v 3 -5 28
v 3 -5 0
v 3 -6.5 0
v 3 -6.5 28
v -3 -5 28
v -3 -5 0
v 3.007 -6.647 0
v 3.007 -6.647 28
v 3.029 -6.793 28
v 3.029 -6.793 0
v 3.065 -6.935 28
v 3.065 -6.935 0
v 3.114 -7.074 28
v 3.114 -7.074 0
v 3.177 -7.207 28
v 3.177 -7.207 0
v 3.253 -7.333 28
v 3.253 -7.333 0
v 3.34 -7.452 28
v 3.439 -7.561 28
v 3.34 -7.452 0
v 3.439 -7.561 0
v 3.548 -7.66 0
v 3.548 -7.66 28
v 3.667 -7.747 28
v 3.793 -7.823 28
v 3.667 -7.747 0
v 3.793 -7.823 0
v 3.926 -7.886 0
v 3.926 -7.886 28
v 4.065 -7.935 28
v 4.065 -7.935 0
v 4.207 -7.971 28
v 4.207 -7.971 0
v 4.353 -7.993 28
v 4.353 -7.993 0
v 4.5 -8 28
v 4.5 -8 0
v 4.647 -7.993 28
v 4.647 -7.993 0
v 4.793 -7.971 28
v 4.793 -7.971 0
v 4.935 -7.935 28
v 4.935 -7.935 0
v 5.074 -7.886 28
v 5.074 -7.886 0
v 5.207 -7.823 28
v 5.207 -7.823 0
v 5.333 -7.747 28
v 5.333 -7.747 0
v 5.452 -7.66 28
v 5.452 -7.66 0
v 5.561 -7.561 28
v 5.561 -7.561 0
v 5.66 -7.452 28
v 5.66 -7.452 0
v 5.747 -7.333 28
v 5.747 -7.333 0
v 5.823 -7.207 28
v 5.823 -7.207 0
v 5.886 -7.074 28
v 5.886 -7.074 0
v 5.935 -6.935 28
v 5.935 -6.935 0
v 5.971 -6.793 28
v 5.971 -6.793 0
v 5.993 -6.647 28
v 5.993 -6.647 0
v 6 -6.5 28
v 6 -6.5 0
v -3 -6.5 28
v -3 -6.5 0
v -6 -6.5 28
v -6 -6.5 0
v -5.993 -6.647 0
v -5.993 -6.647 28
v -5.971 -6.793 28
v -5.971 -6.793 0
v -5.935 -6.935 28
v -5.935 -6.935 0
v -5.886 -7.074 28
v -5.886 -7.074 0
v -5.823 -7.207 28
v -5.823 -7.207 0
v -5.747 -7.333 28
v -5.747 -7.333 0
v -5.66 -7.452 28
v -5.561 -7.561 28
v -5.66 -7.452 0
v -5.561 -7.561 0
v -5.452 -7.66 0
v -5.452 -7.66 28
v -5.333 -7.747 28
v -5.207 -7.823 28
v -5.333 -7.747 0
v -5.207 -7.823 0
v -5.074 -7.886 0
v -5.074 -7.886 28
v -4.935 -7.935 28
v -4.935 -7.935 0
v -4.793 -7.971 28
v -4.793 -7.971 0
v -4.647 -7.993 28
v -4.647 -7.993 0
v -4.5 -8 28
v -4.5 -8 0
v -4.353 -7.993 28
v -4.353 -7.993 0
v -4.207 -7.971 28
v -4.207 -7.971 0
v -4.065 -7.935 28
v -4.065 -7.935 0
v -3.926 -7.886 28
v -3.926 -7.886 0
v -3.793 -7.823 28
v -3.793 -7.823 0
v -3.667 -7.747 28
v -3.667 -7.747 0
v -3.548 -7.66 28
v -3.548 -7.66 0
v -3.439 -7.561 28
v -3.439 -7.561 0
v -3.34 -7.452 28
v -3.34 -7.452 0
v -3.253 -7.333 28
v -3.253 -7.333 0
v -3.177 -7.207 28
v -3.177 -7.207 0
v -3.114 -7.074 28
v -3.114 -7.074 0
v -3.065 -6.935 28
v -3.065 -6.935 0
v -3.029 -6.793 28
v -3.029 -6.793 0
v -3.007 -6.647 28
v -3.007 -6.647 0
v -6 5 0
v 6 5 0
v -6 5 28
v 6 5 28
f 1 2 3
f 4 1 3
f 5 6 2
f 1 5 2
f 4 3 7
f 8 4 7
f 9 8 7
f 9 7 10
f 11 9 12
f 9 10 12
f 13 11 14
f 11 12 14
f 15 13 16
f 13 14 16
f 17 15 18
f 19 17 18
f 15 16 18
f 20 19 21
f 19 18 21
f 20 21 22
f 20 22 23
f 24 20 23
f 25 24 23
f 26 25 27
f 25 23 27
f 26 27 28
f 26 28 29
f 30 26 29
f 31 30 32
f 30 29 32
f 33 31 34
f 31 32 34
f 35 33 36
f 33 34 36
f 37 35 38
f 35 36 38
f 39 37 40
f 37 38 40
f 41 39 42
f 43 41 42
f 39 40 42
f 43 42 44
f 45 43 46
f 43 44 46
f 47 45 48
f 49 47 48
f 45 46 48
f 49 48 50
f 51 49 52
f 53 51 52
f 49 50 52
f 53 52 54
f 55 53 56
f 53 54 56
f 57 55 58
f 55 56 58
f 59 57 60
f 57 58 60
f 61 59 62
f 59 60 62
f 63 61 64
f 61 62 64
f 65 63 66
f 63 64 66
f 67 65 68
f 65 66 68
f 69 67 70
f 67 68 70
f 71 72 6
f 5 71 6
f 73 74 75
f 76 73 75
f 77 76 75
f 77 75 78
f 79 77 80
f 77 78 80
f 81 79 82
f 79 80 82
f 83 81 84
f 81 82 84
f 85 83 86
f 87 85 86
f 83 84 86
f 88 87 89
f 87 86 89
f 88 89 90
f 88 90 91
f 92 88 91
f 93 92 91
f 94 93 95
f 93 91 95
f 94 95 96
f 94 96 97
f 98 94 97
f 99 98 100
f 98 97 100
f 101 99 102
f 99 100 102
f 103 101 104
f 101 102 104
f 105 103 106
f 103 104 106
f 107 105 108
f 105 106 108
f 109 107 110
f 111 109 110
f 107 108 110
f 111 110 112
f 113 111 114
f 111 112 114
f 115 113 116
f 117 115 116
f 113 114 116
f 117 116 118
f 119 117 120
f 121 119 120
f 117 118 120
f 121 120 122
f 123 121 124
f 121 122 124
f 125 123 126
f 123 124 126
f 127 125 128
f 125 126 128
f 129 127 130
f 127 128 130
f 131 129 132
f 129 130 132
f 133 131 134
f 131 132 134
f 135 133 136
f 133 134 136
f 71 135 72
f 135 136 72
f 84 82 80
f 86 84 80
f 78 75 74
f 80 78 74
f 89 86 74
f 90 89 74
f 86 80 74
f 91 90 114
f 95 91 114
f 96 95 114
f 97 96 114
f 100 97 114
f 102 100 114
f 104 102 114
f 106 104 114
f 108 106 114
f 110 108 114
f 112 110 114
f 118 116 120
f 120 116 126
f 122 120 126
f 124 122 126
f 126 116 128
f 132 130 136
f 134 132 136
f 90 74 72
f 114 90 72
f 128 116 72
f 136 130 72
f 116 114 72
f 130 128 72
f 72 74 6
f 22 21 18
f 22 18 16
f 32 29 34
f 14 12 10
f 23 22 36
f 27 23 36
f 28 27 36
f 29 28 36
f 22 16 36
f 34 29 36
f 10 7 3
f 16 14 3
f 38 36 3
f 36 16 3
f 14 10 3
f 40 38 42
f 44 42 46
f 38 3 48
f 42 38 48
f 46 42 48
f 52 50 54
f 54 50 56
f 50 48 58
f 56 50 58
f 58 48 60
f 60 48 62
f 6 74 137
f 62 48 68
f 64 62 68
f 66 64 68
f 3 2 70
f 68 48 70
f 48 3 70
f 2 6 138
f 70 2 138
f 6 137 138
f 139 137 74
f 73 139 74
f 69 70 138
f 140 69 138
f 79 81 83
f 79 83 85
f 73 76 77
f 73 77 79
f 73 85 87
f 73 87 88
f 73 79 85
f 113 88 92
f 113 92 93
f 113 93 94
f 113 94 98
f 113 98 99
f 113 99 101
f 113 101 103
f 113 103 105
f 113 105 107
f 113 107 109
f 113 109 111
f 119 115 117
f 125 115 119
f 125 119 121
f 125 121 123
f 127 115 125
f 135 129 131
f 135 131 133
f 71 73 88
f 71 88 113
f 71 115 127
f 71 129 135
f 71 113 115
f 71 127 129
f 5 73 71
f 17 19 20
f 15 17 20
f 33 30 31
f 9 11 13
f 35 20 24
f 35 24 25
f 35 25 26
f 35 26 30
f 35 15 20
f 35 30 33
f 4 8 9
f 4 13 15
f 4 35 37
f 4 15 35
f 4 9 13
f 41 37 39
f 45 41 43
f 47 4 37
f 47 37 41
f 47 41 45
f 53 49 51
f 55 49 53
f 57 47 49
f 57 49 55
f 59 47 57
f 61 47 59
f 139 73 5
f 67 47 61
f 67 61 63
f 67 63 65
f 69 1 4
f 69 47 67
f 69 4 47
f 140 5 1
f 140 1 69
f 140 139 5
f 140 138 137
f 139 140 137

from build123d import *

# Parameters (mm, degrees)
BOSS_EXTRUDE1_DEPTH = 28


with BuildPart() as part:
    # Sketch1 → Boss-Extrude1 (new body)
    with BuildSketch(Plane.XY):
        with BuildLine():
            Line((-3, -5), (3, -5))
            Line((3, -5), (3, -6.5))
            ThreePointArc((3, -6.5), (4.5, -8), (6, -6.5))
            Line((6, -6.5), (6, -5))
            Line((6, -5), (6, 5))
            Line((6, 5), (-6, 5))
            Line((-6, 5), (-6, -5))
            Line((-6, -5), (-6, -6.5))
            ThreePointArc((-6, -6.5), (-4.5, -8), (-3, -6.5))
            Line((-3, -6.5), (-3, -5))
        make_face()
    extrude(amount=BOSS_EXTRUDE1_DEPTH)


solid = part.part
